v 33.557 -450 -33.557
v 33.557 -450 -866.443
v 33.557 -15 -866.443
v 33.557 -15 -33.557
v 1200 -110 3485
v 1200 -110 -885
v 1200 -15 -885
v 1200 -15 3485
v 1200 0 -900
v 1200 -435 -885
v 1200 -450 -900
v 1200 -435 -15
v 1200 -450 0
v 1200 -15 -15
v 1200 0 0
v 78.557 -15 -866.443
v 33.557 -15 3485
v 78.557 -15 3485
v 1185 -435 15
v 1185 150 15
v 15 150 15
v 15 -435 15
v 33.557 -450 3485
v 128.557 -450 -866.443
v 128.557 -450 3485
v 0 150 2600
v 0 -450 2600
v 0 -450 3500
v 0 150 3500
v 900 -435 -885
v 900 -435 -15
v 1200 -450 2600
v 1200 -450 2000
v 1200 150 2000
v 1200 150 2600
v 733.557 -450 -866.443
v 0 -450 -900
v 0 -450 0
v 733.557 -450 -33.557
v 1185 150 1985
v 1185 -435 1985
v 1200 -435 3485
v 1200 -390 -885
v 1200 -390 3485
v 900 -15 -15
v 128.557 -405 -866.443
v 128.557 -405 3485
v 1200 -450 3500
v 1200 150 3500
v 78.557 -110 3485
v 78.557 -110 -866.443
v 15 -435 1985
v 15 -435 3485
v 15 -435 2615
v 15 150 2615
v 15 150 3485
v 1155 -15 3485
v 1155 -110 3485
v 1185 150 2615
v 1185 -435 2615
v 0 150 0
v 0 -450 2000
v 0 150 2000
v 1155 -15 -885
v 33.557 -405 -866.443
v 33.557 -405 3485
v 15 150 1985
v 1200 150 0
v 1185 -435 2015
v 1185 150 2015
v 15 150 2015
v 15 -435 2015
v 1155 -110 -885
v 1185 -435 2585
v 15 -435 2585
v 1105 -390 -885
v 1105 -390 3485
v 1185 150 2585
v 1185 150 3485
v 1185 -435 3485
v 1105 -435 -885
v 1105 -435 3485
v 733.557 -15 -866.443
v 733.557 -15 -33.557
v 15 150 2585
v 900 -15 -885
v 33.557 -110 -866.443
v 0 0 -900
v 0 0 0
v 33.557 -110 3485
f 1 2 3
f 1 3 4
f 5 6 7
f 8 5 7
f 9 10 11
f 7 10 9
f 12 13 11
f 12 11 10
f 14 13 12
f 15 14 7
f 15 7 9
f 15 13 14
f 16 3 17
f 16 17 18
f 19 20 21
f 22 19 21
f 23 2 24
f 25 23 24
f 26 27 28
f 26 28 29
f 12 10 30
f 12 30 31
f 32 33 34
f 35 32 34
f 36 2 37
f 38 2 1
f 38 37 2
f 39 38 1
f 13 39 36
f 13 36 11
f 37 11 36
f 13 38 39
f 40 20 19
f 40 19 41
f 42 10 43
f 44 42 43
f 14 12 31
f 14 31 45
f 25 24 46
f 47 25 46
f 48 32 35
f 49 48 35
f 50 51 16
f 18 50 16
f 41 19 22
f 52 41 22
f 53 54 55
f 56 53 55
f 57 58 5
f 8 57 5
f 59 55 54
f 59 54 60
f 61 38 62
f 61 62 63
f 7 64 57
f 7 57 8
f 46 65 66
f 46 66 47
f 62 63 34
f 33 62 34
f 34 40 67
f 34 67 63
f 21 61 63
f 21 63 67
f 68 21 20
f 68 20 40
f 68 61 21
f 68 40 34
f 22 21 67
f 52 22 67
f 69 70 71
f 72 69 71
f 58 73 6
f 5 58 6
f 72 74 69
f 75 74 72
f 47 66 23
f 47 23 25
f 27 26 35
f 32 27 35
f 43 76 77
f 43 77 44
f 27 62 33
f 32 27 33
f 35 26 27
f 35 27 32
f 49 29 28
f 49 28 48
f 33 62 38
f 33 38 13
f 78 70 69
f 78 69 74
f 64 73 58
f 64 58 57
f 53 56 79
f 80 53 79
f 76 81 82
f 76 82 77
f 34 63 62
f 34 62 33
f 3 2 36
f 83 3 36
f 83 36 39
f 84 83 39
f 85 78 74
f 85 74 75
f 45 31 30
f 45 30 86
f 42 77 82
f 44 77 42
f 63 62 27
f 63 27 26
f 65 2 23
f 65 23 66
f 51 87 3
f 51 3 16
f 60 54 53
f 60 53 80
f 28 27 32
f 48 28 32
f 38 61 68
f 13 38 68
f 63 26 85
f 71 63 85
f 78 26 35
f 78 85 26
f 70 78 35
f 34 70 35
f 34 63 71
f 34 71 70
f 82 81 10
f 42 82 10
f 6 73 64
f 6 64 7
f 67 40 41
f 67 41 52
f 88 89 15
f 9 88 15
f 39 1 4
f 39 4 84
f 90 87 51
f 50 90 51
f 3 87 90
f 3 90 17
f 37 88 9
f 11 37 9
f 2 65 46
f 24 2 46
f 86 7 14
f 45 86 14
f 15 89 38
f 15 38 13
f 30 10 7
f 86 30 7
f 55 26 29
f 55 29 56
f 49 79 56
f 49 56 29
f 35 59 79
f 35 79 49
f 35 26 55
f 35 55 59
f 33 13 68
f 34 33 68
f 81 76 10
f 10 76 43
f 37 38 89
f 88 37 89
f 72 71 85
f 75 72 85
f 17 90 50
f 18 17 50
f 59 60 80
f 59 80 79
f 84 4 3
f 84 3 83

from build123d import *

# Parameters (mm, degrees)
F0_W      = 1200
F0_H      = 450
F1_DEPTH  = 900
F2_W      = 1200
F2_H      = 600
F3_DEPTH  = 2000
F4_W      = 1200
F4_H      = 600
F5_DEPTH  = 600
F6_W      = 1200
F6_H      = 600
F7_DEPTH  = 900
F8_W      = 420
F8_H      = 870
F9_DEPTH  = 300
F10_W     = 700
F10_H     = 832.8860864043
F11_DEPTH = 435
F12_W     = 1170
F12_H     = 1970
F13_DEPTH = 585
F14_W     = 1170
F14_H     = 570
F15_DEPTH = 585
F16_T     = -15
F17_W     = 95
F17_H     = 45
F18_DEPTH = 4370
F19_W     = 95
F19_H     = 45
F20_DEPTH = 4351.4430432022
F21_W     = 45
F21_H     = 95
F22_DEPTH = 4351.4430432022
F23_W     = 45
F23_H     = 95
F24_DEPTH = 4370


with BuildPart() as f1:
    # F0 (on Top) → F1 (new body)
    with BuildSketch(Plane.XY):
        with Locations((600, -225)):
            Rectangle(F0_W, F0_H)
    extrude(amount=-F1_DEPTH)

    # F8 (on face) → F9 (cut)
    with BuildSketch(Plane.YZ.offset(1200)):
        with Locations((-225, -450)):
            Rectangle(F8_W, F8_H)
    extrude(amount=-F9_DEPTH, mode=Mode.SUBTRACT)

    # F10 (on face) → F11 (cut)
    with BuildSketch(Plane.XZ.offset(450)):
        with Locations((383.5569567978, -450)):
            Rectangle(F10_W, F10_H)
    extrude(amount=-F11_DEPTH, mode=Mode.SUBTRACT)


with BuildPart() as f3:
    # F2 (on face) → F3 (new body)
    with BuildSketch(Plane.XY):
        with Locations((600, -150)):
            Rectangle(F2_W, F2_H)
    extrude(amount=F3_DEPTH)

    # F12 (on face) → F13 (cut)
    with BuildSketch(Plane(origin=(0, 150, 0), x_dir=(-1, 0, 0), z_dir=(0, 1, 0))):
        with Locations((-600, 1000)):
            Rectangle(F12_W, F12_H)
    extrude(amount=-F13_DEPTH, mode=Mode.SUBTRACT)


with BuildPart() as f5:
    # F4 (on face) → F5 (new body)
    with BuildSketch(Plane.XY.offset(2000)):
        with Locations((600, -150)):
            Rectangle(F4_W, F4_H)
    extrude(amount=F5_DEPTH)

    # F14 (on face) → F15 (cut)
    with BuildSketch(Plane(origin=(0, 150, 0), x_dir=(-1, 0, 0), z_dir=(0, 1, 0))):
        with Locations((-600, 2300)):
            Rectangle(F14_W, F14_H)
    extrude(amount=-F15_DEPTH, mode=Mode.SUBTRACT)


with BuildPart() as f7:
    # F6 (on face) → F7 (new body)
    with BuildSketch(Plane.XY.offset(2600)):
        with Locations((600, -150)):
            Rectangle(F6_W, F6_H)
    extrude(amount=F7_DEPTH)

    # F16
    f16_openings = [f7.faces().sort_by_distance(p)[0] for p in [
        (600, 150, 3050),
    ]]
    offset(amount=F16_T, openings=f16_openings)


with BuildPart() as f18:
    # F17 (on face) → F18 (new body, through all)
    with BuildSketch(Plane.XY.offset(-885)):
        with Locations((1152.5, -412.5)):
            Rectangle(F17_W, F17_H)
    extrude(amount=F18_DEPTH)


with BuildPart() as f20:
    # F19 (on face) → F20 (new body, through all)
    with BuildSketch(Plane.XY.offset(-866.4430432022)):
        with Locations((81.0569567978, -427.5)):
            Rectangle(F19_W, F19_H)
    extrude(amount=F20_DEPTH)


with BuildPart() as f22:
    # F21 (on face) → F22 (new body, through all)
    with BuildSketch(Plane.XY.offset(-866.4430432022)):
        with Locations((56.0569567978, -62.5)):
            Rectangle(F21_W, F21_H)
    extrude(amount=F22_DEPTH)


with BuildPart() as f24:
    # F23 (on face) → F24 (new body, through all)
    with BuildSketch(Plane.XY.offset(-885)):
        with Locations((1177.5, -62.5)):
            Rectangle(F23_W, F23_H)
    extrude(amount=F24_DEPTH)


solid = Compound([f1.part, f3.part, f5.part, f7.part, f18.part, f20.part, f22.part, f24.part])
